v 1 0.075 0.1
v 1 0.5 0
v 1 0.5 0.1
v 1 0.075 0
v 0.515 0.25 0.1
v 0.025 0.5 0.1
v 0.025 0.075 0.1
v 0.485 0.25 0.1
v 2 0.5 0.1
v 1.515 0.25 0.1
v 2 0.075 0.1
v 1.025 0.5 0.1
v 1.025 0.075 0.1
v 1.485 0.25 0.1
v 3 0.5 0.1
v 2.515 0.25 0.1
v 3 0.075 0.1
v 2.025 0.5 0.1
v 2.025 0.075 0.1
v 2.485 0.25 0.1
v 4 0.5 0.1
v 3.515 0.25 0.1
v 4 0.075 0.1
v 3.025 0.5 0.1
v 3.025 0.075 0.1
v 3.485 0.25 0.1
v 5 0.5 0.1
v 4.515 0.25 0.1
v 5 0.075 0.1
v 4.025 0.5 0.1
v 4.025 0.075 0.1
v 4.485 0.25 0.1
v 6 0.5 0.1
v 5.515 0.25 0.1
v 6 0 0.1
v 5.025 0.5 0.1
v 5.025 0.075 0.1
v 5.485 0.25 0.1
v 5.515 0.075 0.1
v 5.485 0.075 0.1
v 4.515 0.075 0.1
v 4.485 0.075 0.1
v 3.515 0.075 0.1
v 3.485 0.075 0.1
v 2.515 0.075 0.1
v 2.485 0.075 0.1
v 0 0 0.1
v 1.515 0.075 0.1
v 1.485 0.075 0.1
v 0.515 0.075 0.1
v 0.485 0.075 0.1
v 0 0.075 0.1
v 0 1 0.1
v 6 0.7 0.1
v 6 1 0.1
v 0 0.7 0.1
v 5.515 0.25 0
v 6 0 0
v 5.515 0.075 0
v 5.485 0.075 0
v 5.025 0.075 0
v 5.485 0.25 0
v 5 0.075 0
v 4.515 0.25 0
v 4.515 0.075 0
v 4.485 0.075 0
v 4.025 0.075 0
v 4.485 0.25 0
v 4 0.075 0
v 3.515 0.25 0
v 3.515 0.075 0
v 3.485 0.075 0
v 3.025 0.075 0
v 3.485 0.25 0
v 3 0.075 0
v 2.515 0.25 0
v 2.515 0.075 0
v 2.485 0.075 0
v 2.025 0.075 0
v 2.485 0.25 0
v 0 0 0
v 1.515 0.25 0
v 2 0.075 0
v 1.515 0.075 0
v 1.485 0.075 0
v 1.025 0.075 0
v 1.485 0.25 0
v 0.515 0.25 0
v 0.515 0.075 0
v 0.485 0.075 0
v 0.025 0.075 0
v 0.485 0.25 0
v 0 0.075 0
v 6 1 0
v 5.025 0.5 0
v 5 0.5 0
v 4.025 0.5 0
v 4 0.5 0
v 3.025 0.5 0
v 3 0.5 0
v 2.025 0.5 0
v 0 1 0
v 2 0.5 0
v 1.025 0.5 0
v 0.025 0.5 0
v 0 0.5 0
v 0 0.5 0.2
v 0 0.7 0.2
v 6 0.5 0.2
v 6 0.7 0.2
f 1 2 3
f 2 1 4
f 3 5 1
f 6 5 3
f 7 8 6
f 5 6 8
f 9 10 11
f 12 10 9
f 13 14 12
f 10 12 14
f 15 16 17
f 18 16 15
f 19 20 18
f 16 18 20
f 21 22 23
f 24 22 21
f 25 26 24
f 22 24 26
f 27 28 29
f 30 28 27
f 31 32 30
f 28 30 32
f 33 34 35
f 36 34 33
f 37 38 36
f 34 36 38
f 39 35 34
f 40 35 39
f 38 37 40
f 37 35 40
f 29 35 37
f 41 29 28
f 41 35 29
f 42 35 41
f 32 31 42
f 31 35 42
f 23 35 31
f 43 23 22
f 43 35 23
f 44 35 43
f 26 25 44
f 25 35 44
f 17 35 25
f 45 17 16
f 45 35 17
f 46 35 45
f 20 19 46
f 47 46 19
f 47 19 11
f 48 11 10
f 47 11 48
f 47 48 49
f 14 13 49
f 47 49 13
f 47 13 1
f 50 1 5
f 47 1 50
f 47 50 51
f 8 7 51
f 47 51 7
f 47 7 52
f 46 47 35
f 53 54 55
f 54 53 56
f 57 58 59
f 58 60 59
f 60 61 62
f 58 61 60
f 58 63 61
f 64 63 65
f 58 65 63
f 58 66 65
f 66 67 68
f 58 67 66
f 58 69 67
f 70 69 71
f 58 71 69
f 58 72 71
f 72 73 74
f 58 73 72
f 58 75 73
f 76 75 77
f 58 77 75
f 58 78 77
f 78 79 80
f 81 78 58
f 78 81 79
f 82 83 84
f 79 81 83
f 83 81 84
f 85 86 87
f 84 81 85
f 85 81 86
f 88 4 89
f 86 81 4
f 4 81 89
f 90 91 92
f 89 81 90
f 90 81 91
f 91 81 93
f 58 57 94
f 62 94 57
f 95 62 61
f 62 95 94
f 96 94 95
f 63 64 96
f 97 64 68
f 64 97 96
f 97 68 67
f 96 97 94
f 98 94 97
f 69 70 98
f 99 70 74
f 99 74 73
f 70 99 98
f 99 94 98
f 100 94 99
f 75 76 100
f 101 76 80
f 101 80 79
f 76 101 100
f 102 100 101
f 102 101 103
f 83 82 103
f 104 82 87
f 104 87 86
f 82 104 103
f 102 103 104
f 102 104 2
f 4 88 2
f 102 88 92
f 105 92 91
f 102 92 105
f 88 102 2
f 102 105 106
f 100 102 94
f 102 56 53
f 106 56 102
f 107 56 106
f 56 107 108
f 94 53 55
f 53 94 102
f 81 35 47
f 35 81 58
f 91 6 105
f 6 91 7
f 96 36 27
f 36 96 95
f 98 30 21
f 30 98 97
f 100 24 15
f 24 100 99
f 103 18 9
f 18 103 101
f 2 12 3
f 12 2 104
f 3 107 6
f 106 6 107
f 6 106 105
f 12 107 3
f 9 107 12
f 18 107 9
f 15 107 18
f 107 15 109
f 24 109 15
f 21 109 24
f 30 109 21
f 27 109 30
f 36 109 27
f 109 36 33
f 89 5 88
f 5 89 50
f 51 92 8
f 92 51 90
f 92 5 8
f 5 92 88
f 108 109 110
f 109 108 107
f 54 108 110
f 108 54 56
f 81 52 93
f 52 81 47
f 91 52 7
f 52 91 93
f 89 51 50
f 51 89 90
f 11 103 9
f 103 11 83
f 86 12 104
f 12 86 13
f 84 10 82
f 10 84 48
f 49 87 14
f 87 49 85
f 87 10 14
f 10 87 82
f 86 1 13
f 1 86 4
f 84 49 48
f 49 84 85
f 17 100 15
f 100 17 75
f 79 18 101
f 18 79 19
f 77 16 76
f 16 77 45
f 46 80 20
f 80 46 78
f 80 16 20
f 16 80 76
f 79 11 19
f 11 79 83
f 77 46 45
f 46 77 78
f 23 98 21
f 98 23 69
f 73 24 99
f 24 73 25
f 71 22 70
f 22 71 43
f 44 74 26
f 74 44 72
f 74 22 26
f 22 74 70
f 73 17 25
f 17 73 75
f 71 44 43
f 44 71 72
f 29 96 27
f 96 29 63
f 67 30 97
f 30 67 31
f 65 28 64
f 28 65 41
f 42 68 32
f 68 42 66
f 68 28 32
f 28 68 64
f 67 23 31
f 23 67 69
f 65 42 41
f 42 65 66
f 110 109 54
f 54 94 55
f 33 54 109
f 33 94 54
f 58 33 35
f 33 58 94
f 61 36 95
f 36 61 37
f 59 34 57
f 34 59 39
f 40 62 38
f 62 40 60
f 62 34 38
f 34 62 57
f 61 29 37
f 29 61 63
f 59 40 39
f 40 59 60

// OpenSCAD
l=5;
for(i = [0:l])
{
    union()
    {
    difference()
    {
    difference()
    {
        translate([i,0,0]) cube([1, 1, 0.1]);
        translate([i, 0, 0]) cube([0.05, 1, 2], center=true);
    }
    translate([i+0.5, 0, 0]) cube([0.03, 0.5, 2], center=true);
    }
    translate([i, 0.5,0])cube([1,0.2,0.2]);
    translate([i, 0,0])cube([1,0.075,0.1]);
    }
}
